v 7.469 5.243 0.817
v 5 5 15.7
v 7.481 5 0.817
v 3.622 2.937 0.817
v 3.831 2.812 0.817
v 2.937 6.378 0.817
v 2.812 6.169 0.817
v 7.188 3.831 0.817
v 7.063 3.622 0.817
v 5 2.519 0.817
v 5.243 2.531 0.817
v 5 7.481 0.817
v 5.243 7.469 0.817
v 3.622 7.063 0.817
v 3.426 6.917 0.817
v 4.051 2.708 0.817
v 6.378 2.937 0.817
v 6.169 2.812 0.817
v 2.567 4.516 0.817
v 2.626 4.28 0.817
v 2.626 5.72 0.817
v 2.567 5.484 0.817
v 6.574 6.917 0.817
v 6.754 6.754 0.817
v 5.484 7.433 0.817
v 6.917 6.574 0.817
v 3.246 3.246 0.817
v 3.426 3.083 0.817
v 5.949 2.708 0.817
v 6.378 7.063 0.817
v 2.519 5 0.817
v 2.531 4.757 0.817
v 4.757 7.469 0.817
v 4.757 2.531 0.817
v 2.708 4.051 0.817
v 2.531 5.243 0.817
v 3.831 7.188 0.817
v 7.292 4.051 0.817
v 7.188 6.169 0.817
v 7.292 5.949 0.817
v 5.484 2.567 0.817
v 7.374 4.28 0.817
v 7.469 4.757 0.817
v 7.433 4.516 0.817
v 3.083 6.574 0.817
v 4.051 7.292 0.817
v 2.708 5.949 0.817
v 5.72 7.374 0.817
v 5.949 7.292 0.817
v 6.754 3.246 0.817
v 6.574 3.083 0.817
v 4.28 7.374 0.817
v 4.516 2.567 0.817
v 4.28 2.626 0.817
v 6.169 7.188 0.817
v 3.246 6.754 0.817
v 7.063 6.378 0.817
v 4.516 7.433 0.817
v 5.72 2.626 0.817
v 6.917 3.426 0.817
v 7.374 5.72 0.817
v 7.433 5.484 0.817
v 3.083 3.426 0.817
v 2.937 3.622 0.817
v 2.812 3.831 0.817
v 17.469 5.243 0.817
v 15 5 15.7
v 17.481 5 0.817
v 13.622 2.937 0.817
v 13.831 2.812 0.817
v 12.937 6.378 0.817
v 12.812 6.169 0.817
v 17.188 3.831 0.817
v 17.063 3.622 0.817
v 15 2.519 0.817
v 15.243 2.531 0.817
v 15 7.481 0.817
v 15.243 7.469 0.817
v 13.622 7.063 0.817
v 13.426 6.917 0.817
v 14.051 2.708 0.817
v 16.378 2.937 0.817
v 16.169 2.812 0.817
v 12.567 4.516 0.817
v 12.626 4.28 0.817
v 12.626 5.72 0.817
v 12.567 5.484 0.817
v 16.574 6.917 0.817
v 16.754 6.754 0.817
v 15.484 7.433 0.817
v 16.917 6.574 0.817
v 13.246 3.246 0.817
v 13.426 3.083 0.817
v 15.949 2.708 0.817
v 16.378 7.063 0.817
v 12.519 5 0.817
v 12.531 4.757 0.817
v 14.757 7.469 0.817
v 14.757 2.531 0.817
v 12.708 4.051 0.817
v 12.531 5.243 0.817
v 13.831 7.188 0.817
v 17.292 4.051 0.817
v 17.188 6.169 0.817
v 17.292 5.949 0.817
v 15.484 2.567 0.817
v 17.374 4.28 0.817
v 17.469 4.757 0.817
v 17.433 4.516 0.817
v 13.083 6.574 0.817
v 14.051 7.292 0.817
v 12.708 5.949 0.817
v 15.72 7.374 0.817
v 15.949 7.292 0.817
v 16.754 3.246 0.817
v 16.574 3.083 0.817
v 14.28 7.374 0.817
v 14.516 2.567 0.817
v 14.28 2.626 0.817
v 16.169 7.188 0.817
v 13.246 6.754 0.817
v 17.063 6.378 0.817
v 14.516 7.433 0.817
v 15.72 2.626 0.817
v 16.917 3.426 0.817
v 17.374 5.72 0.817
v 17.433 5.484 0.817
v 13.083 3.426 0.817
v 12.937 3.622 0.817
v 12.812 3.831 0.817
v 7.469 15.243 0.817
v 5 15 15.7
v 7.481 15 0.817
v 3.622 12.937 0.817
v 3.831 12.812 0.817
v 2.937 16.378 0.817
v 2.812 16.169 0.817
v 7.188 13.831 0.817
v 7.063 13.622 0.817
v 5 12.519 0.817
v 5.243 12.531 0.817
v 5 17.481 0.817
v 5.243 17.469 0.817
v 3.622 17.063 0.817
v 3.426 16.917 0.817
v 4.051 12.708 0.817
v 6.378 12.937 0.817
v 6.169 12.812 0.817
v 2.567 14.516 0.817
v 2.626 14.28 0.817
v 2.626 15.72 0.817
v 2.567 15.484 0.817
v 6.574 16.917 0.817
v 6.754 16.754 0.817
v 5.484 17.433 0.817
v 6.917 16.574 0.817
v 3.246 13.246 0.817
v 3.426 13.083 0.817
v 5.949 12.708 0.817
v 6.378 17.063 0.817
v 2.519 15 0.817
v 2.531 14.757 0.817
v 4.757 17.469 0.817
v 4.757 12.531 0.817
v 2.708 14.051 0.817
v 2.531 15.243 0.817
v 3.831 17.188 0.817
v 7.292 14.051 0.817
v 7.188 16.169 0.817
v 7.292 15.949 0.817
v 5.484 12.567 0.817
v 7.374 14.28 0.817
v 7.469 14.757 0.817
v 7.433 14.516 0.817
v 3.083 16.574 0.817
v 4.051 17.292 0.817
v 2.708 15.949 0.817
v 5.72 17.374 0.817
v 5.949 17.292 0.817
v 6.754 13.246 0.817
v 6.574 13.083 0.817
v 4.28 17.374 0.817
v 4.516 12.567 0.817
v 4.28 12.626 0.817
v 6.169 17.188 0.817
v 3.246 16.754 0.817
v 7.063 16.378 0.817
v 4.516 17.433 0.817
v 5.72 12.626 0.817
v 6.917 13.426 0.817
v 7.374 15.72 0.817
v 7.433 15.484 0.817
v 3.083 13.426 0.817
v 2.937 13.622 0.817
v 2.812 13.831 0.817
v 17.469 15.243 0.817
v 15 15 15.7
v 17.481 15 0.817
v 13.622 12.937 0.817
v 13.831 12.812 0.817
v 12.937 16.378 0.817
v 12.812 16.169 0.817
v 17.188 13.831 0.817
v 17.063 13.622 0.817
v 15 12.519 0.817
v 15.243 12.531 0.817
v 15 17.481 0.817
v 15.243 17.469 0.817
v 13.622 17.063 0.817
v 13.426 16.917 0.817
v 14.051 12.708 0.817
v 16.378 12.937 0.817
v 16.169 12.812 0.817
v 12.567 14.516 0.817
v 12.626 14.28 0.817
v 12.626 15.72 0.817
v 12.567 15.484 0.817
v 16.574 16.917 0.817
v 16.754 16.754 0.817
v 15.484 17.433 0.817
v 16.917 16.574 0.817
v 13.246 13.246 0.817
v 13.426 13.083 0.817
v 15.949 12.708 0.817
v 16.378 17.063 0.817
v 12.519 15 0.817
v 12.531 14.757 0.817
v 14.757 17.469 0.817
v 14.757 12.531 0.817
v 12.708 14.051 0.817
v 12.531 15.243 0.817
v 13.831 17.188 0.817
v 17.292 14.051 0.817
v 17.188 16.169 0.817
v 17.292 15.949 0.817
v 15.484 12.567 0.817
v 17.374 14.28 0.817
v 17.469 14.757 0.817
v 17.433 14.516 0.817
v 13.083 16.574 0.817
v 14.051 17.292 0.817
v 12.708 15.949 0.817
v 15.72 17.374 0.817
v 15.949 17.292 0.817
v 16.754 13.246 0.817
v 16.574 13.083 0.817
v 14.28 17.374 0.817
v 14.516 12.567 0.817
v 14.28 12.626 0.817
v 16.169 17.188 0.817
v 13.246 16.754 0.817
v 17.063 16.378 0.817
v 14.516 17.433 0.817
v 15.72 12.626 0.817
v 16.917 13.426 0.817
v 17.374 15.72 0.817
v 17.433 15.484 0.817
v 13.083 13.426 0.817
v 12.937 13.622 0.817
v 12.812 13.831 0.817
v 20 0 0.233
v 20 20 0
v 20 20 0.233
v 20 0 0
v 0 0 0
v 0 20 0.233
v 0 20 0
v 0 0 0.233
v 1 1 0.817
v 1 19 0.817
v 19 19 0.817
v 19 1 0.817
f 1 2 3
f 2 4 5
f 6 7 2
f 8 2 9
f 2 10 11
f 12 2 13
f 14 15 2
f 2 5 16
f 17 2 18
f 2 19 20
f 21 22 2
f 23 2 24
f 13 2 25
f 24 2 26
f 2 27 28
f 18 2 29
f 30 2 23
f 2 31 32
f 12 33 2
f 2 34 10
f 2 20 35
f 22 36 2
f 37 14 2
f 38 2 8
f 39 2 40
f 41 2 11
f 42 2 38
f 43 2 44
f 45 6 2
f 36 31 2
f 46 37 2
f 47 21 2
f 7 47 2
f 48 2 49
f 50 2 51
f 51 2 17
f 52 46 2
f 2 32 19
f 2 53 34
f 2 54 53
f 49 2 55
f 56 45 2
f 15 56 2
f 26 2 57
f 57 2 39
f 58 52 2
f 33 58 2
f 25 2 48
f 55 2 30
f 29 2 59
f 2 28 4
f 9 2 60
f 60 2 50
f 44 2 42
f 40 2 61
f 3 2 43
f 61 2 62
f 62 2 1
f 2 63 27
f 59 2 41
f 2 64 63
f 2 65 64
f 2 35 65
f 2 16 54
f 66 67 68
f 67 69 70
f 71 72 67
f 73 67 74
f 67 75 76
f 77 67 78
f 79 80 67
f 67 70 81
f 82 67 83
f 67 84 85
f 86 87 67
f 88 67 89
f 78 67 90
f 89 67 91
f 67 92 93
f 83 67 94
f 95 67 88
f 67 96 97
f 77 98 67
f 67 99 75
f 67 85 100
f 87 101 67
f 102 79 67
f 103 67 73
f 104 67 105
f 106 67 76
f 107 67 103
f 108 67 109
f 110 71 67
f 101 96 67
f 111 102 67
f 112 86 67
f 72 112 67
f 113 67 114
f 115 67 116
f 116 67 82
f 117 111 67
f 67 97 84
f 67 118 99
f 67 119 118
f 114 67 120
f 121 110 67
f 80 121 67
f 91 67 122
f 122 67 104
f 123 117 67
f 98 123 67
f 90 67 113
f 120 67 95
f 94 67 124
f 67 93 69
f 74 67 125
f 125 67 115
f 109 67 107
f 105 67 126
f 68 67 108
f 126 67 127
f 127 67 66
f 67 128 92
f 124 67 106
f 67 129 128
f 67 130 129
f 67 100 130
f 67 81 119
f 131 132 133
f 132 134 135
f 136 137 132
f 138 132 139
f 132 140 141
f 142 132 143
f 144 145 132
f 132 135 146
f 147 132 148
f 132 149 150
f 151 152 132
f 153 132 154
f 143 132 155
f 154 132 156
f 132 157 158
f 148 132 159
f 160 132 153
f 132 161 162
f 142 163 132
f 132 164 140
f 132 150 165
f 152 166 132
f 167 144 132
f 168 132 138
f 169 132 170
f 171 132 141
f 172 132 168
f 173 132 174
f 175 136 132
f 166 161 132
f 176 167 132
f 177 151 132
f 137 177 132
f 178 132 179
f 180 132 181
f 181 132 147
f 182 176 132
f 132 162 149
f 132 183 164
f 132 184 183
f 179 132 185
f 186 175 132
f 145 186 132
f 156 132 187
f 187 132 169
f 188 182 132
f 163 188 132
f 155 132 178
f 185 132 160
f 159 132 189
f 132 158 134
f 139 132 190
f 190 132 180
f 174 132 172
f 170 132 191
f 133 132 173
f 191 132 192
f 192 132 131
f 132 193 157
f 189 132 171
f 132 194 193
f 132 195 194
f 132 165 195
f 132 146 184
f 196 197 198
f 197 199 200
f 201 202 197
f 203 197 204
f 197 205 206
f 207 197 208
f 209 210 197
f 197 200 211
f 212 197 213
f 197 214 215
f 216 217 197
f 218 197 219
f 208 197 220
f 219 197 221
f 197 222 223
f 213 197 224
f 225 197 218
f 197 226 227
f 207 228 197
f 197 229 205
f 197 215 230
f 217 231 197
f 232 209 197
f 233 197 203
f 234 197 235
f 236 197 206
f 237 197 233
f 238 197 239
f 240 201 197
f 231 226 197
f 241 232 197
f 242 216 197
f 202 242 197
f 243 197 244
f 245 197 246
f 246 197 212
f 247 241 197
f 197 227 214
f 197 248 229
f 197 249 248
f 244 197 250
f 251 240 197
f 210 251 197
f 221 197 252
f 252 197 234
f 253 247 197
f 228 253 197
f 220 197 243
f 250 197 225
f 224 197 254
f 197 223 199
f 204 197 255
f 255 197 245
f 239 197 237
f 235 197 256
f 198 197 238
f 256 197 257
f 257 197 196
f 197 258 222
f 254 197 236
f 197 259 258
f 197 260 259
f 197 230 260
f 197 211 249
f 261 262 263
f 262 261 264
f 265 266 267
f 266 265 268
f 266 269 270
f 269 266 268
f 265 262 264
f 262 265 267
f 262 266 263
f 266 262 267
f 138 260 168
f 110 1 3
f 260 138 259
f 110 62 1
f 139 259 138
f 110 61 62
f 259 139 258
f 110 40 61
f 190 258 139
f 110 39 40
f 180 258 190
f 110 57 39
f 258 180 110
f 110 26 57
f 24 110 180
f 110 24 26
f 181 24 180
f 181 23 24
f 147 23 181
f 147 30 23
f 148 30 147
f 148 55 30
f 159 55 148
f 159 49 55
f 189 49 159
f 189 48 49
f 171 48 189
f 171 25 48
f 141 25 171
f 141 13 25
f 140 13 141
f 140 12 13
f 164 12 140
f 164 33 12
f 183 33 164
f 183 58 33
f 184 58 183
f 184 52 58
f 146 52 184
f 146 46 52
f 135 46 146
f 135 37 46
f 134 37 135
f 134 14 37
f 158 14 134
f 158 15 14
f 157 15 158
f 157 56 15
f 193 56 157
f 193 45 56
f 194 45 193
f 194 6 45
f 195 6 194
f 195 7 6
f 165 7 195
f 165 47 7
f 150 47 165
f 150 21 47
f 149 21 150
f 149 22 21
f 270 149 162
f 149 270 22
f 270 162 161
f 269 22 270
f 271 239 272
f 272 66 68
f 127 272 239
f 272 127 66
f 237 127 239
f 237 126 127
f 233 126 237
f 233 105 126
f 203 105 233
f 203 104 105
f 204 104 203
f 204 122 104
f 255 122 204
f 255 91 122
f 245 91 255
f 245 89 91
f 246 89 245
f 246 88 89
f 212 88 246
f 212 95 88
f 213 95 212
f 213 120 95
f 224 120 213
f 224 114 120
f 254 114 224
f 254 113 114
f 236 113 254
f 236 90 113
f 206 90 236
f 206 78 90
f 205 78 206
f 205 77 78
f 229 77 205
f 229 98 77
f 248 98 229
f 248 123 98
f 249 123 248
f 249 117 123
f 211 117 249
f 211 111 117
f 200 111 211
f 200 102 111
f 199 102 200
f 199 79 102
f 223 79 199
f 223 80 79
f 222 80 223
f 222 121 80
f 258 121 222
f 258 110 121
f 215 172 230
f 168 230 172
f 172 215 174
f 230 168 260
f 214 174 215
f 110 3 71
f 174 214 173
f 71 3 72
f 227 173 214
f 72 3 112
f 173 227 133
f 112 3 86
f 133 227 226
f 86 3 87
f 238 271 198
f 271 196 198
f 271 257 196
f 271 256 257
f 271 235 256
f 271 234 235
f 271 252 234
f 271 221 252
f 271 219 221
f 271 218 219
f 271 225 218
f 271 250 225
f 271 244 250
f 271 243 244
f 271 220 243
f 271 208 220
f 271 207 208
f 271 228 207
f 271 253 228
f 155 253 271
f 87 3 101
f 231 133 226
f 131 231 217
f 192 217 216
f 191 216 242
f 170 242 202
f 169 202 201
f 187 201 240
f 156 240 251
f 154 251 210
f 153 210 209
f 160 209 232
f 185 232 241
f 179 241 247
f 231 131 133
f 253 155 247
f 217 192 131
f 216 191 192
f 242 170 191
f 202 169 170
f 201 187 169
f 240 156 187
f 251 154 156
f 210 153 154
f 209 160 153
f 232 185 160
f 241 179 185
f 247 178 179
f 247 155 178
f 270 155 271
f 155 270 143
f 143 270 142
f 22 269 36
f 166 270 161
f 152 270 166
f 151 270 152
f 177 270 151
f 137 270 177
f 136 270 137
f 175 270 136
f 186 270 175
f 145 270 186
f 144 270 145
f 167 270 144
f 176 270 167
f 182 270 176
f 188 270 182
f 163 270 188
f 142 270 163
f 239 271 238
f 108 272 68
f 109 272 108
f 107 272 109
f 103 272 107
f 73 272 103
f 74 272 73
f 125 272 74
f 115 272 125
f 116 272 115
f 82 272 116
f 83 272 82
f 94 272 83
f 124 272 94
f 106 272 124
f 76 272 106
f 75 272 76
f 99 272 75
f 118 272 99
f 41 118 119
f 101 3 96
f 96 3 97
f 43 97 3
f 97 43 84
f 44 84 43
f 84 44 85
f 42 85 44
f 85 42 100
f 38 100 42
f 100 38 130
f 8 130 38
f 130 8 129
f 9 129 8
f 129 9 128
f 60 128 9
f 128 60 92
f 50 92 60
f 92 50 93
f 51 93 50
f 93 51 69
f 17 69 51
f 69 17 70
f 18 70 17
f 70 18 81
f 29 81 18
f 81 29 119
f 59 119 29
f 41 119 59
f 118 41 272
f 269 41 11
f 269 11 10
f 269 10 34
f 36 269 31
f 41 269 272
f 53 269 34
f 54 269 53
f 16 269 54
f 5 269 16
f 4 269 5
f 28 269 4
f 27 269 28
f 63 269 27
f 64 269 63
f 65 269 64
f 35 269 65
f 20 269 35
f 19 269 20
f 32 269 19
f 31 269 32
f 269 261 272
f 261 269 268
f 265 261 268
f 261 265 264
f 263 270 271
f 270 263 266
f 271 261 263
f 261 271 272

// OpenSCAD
// Hårete
bredde = 20;
dybde = 10;
tykkelse = 0.7;
hoyde = 15;

hull() {
    cube([bredde,bredde,tykkelse/3]);
    translate([1,1,tykkelse/3*2])
        cube([bredde-2,bredde-2,tykkelse/2]);
}
for (i = [0:1]) {
    translate([0,i*(bredde-dybde),0]) {
        translate([dybde/2,dybde/2,tykkelse]) {
            cylinder(h=hoyde,d1=dybde/2,d2=0,$fn=64);
        }
        translate([bredde-dybde/2,dybde/2,tykkelse]) {
            cylinder(h=hoyde,d1=dybde/2,d2=0,$fn=64);
        }
    }
}
